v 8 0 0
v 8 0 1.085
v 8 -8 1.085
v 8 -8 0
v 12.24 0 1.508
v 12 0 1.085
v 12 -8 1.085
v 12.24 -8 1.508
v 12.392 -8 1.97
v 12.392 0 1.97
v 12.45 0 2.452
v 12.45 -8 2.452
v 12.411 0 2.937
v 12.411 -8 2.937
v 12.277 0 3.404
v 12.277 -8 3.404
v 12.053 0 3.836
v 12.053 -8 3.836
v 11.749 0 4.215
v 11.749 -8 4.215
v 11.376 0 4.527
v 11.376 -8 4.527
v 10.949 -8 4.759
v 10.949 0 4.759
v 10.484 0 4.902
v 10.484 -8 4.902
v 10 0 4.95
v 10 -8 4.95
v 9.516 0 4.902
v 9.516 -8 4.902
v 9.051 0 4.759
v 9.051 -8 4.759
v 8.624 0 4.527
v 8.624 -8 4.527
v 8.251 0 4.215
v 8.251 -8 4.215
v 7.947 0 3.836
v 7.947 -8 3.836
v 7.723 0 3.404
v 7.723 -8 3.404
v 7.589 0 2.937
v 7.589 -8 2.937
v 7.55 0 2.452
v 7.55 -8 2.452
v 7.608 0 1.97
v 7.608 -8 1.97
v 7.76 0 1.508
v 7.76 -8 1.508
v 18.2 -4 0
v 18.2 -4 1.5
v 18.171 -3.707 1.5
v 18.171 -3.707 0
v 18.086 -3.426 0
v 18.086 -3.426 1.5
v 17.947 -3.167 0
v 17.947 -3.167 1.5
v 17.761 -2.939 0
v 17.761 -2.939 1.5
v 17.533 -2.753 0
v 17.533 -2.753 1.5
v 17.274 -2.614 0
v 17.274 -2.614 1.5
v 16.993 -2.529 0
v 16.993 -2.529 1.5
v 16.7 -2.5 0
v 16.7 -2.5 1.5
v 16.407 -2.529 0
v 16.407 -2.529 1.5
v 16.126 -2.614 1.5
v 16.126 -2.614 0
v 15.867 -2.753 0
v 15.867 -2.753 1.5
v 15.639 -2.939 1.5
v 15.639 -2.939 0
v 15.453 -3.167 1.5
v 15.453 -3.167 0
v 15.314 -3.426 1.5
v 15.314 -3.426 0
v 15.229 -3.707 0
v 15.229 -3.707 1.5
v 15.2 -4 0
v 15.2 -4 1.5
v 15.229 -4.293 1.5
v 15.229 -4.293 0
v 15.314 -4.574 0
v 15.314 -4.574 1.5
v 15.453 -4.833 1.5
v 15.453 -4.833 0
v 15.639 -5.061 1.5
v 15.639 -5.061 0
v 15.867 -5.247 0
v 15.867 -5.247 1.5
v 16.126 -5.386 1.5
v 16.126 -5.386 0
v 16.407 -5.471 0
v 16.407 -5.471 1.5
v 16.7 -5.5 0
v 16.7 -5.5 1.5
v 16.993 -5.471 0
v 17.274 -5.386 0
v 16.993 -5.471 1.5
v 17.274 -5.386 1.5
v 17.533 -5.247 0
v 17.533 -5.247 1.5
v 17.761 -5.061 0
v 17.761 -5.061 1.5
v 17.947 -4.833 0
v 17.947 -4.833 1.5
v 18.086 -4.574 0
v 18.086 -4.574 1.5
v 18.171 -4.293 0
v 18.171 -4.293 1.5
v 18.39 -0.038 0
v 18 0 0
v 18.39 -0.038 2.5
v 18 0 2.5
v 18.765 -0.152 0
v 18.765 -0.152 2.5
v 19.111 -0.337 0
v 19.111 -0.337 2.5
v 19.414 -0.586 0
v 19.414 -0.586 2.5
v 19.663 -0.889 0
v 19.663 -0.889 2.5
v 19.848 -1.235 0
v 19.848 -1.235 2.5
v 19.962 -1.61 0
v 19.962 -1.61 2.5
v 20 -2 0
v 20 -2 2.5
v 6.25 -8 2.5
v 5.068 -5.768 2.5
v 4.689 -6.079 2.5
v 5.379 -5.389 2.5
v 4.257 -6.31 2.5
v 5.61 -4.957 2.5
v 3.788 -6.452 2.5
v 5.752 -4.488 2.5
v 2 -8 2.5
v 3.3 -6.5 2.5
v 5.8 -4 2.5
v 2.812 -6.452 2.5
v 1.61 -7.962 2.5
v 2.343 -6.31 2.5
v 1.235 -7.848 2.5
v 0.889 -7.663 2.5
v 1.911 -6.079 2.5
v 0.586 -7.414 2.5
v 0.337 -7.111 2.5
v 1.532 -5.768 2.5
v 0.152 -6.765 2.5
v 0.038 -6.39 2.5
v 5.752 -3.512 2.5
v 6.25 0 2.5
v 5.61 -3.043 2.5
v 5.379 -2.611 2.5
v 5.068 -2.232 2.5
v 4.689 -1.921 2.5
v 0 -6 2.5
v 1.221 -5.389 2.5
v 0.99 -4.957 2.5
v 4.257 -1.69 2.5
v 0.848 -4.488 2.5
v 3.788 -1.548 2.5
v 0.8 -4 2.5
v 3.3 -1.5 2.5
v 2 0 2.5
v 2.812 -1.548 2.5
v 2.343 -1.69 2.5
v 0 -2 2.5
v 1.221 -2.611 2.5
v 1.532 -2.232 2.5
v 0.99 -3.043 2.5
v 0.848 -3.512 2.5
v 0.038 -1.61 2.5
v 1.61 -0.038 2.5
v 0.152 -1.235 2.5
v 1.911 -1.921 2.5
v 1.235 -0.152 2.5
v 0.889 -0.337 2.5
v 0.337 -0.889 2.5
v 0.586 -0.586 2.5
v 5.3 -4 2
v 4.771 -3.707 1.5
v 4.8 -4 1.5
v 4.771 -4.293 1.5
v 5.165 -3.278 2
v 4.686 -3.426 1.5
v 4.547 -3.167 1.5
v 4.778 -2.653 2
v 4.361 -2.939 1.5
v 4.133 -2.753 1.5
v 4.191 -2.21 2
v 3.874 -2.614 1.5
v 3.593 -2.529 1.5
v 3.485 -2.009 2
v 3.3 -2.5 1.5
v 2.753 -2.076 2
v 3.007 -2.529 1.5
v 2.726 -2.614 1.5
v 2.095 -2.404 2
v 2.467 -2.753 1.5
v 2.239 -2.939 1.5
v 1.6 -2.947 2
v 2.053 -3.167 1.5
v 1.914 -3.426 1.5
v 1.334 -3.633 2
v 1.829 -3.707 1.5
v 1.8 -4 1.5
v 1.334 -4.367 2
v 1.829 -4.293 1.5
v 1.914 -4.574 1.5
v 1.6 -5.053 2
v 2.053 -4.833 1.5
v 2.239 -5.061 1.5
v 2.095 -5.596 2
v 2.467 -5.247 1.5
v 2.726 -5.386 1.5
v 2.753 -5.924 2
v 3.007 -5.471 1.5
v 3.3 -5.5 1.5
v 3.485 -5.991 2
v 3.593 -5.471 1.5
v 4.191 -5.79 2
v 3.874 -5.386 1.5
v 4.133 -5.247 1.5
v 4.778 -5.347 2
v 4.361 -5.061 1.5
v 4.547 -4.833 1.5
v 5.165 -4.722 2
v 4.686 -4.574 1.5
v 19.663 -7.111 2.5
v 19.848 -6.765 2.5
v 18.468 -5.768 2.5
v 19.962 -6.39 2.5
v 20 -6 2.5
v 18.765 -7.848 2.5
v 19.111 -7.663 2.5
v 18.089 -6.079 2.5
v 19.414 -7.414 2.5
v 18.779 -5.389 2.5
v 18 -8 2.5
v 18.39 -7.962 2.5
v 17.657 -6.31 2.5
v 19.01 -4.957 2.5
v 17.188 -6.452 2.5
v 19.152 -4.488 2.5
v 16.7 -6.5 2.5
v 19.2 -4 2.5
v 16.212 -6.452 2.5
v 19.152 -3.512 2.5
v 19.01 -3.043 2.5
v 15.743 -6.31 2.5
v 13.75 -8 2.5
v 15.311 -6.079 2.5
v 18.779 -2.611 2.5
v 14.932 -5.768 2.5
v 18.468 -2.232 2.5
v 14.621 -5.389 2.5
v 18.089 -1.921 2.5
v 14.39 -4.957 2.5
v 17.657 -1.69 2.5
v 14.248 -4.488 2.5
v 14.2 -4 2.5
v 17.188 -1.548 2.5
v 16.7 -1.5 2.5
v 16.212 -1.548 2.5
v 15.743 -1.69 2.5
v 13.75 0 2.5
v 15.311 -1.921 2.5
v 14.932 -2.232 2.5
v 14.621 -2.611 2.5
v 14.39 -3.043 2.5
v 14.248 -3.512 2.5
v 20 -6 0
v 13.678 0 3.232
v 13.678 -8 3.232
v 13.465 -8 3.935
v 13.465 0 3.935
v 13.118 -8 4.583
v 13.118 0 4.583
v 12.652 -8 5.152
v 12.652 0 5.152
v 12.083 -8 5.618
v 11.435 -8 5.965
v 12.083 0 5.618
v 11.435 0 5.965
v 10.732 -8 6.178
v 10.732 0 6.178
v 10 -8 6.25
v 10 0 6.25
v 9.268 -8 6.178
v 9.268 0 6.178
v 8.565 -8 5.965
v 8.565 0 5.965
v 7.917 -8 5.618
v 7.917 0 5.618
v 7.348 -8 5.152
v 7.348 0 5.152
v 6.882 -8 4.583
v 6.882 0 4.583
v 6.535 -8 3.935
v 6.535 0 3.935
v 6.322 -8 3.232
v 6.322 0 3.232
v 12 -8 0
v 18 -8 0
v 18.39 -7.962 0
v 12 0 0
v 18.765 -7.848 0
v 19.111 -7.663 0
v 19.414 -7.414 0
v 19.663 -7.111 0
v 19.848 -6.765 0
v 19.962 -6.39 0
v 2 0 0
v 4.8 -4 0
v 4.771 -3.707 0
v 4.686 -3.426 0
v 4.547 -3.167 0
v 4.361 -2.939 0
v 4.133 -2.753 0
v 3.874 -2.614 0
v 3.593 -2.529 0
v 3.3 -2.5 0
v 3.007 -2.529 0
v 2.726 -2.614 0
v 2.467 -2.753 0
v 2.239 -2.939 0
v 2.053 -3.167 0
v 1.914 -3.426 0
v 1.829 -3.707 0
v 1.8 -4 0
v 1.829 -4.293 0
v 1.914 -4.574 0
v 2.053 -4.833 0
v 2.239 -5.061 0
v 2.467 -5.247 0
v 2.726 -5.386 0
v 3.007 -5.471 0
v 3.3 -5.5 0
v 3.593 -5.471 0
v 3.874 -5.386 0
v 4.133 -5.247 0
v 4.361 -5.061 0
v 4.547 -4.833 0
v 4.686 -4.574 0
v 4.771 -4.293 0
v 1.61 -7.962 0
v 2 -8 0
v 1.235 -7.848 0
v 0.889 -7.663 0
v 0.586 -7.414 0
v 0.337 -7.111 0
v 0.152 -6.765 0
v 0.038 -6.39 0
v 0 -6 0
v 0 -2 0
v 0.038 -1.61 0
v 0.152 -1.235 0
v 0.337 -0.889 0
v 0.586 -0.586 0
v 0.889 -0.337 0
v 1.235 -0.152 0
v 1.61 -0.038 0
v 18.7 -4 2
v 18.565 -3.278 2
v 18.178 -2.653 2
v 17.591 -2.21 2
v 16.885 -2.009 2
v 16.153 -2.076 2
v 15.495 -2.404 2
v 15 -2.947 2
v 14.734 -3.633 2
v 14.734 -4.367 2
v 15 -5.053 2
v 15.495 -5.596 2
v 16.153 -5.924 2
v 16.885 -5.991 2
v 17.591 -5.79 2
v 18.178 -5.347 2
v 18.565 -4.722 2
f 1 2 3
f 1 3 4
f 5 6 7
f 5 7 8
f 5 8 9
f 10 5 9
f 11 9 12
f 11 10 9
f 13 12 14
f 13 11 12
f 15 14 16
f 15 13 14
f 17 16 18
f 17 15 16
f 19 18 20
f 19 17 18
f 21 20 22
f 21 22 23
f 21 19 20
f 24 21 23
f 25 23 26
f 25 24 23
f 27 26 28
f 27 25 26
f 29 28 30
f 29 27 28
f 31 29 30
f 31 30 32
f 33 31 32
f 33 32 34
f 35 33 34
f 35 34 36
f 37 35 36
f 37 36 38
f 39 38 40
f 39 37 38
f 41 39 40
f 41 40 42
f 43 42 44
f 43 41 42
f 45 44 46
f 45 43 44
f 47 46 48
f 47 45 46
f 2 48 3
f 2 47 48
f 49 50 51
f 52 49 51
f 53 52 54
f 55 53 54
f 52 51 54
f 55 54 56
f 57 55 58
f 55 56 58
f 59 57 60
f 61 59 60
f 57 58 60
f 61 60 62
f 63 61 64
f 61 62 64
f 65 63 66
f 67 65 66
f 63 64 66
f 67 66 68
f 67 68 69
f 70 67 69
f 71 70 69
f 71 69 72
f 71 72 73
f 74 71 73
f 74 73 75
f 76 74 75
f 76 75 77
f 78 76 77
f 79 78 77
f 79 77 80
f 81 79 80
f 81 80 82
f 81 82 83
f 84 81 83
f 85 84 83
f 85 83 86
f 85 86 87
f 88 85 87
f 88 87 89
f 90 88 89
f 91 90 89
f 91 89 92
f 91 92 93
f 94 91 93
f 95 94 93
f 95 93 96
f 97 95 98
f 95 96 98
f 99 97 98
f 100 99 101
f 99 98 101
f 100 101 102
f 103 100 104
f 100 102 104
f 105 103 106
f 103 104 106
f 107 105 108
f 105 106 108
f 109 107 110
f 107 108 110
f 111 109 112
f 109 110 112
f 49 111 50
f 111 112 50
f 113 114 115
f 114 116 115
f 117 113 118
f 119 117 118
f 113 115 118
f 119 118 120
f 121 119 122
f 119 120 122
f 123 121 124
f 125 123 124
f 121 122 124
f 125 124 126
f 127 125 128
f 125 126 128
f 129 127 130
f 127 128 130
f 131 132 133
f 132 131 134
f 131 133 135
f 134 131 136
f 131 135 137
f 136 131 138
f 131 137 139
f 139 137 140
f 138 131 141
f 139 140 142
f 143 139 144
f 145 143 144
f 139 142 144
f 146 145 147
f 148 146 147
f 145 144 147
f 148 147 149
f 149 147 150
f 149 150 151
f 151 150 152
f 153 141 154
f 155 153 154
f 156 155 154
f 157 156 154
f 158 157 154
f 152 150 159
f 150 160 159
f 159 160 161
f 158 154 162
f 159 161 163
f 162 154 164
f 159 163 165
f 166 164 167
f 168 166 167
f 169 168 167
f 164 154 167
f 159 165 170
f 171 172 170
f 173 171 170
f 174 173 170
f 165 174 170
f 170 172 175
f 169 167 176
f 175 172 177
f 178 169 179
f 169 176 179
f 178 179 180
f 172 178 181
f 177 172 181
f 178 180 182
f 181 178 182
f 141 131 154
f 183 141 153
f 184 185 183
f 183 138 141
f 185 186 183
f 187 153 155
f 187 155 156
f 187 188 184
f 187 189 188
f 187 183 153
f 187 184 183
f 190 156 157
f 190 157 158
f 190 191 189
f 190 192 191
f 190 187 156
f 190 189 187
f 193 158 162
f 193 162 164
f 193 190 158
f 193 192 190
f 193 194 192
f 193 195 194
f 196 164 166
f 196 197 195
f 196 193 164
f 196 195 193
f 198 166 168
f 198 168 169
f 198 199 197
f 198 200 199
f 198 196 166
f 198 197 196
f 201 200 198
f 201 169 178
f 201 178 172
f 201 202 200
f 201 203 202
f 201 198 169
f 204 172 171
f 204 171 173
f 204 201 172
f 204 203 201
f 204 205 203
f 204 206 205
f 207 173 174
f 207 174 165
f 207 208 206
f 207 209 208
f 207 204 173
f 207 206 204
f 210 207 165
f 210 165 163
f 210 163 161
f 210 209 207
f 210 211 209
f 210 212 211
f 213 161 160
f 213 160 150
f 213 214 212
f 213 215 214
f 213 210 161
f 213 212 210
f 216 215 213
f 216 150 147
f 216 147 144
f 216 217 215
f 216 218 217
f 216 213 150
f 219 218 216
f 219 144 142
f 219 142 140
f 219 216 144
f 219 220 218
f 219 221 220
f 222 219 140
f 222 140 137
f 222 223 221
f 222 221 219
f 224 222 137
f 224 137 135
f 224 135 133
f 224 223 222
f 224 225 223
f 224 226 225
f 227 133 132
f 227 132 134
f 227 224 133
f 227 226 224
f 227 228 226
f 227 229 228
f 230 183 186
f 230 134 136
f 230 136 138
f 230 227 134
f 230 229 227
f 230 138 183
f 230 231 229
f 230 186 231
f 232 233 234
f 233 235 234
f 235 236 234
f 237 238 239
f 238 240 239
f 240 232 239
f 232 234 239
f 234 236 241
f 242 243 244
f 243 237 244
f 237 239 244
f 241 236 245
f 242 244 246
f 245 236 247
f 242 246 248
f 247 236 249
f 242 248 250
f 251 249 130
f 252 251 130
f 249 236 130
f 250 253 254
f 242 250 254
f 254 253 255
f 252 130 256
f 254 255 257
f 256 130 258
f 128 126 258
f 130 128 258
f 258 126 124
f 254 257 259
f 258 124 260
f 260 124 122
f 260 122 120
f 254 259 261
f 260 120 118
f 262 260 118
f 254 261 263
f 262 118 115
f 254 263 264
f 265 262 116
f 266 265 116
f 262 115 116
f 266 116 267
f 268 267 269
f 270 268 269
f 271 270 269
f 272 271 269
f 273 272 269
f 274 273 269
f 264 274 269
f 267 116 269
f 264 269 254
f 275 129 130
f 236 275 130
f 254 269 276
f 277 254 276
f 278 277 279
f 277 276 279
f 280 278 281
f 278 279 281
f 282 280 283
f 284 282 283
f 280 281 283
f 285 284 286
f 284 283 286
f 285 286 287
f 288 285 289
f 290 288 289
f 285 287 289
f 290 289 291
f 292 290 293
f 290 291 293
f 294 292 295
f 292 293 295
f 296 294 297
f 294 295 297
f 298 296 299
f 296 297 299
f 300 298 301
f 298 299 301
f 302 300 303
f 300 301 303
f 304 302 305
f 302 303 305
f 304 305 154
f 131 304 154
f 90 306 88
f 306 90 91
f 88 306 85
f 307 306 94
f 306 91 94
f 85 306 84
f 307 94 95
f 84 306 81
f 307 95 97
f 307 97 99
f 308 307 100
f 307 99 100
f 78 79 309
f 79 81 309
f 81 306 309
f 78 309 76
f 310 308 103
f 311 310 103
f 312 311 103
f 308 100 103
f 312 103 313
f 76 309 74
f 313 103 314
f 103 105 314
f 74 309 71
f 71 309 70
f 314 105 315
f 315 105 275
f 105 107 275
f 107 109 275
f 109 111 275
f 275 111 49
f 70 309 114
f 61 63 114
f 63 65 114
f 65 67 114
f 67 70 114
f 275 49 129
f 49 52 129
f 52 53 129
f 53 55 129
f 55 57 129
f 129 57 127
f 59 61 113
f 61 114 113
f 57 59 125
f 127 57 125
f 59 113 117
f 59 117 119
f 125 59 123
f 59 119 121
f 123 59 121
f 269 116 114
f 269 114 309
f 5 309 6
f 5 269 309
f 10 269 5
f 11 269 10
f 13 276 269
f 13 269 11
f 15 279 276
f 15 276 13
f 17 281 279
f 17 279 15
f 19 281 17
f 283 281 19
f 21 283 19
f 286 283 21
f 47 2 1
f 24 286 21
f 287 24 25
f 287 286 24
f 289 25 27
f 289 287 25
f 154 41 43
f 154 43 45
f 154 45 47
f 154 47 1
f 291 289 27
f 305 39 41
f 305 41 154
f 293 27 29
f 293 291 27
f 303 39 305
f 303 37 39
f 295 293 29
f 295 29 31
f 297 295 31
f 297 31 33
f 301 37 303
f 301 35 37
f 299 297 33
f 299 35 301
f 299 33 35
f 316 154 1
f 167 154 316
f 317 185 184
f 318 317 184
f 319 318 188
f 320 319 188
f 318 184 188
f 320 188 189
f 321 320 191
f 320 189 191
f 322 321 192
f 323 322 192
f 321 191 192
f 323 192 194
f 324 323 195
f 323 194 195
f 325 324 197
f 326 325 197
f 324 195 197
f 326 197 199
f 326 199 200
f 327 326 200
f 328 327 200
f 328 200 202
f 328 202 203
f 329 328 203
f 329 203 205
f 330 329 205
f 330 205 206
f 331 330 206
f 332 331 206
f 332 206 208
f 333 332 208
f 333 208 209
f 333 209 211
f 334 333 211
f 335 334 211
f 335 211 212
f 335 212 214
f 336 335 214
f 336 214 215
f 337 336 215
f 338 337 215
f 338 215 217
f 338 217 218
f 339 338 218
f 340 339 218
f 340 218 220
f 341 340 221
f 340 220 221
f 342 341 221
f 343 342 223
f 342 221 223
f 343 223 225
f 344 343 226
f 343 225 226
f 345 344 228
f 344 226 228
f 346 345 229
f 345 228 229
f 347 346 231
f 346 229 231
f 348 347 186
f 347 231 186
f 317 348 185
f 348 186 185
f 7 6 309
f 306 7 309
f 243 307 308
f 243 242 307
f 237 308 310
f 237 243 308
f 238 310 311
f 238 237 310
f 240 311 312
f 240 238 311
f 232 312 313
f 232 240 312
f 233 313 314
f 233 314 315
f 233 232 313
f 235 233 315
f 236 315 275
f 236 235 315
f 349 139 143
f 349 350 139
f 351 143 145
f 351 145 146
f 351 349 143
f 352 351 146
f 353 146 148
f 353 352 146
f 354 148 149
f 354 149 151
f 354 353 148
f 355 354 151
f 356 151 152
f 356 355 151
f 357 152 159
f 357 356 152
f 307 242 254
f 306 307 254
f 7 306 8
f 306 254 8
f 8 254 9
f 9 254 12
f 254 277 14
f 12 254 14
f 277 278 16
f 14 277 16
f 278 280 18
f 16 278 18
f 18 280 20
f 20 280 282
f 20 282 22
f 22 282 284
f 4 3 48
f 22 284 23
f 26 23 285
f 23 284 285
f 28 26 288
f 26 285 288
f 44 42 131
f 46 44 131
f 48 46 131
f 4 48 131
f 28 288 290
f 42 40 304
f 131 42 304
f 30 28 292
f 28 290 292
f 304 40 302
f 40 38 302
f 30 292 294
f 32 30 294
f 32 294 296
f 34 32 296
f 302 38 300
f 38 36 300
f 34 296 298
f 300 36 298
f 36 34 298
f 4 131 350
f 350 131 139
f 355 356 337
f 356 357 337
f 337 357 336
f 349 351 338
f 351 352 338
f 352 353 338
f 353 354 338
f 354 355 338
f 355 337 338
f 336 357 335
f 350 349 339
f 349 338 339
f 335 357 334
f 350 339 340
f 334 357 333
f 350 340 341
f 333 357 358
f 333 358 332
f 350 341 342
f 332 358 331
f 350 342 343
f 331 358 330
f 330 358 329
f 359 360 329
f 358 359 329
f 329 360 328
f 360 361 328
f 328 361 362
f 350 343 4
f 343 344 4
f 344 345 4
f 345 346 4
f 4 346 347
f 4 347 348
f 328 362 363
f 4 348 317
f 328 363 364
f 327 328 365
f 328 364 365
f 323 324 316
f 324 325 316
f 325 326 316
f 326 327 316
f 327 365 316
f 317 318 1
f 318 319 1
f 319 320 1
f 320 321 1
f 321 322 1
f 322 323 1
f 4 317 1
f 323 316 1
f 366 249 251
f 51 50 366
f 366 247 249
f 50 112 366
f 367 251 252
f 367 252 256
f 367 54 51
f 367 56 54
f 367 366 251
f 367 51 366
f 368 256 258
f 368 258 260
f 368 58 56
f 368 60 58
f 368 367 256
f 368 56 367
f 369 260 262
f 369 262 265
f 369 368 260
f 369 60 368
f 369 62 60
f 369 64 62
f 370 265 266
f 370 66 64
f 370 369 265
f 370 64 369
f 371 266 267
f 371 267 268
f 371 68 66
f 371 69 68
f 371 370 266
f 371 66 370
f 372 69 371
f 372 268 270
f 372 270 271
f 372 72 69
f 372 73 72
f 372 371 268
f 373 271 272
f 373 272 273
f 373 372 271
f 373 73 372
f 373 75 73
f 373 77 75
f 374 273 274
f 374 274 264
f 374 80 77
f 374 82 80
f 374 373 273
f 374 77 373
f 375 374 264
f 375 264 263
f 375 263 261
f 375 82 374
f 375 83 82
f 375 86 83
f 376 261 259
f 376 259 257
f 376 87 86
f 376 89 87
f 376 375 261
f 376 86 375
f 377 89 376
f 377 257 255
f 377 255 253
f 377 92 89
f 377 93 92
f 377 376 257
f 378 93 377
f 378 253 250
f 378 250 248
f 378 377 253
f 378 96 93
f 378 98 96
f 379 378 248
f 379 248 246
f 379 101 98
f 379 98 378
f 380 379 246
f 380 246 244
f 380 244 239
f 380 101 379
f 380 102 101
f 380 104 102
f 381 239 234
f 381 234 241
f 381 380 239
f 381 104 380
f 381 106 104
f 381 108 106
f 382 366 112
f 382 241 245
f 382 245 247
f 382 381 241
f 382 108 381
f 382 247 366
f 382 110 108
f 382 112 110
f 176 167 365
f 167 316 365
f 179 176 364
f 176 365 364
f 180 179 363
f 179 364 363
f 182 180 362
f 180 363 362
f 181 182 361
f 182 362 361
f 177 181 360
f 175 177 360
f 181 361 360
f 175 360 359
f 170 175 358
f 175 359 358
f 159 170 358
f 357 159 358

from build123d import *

# Parameters (mm, degrees)
PAD_DEPTH    = 8
SKETCH001_R  = 1.5
POCKET_DEPTH = 2.501
CHAMFER_SIZE = 1
FILLET_R     = 2


with BuildPart() as part:
    # Sketch → Pad (new body)
    with BuildSketch(Plane.XZ):
        with BuildLine():
            ThreePointArc((12, 1.084903), (10, 4.95), (8, 1.084903))
            Line((8, 1.084903), (8, 0))
            Line((0, 0), (8, 0))
            Line((0, 2.5), (0, 0))
            Line((6.25, 2.5), (0, 2.5))
            ThreePointArc((13.75, 2.5), (10, 6.25), (6.25, 2.5))
            Line((20, 2.5), (13.75, 2.5))
            Line((20, 0), (20, 2.5))
            Line((12, 0), (20, 0))
            Line((12, 1.084903), (12, 0))
        make_face()
    extrude(amount=PAD_DEPTH)

    # Sketch001 → Pocket (cut, through all)
    with BuildSketch(Plane.XY.offset(2.5)):
        with Locations((3.3, -4)):
            Circle(SKETCH001_R)
        with Locations((16.7, -4)):
            Circle(SKETCH001_R)
    extrude(amount=-POCKET_DEPTH, mode=Mode.SUBTRACT)

    # Chamfer
    chamfer_edges = [part.edges().sort_by_distance(p)[0] for p in [
        (1.8, -4, 2.5),
        (15.2, -4, 2.5),
    ]]
    chamfer(chamfer_edges, length=CHAMFER_SIZE)

    # Fillet
    fillet_edges = [part.edges().sort_by_distance(p)[0] for p in [
        (0, -8, 1.25),
        (20, -8, 1.25),
        (20, 0, 1.25),
        (0, 0, 1.25),
    ]]
    fillet(fillet_edges, radius=FILLET_R)


solid = part.part
